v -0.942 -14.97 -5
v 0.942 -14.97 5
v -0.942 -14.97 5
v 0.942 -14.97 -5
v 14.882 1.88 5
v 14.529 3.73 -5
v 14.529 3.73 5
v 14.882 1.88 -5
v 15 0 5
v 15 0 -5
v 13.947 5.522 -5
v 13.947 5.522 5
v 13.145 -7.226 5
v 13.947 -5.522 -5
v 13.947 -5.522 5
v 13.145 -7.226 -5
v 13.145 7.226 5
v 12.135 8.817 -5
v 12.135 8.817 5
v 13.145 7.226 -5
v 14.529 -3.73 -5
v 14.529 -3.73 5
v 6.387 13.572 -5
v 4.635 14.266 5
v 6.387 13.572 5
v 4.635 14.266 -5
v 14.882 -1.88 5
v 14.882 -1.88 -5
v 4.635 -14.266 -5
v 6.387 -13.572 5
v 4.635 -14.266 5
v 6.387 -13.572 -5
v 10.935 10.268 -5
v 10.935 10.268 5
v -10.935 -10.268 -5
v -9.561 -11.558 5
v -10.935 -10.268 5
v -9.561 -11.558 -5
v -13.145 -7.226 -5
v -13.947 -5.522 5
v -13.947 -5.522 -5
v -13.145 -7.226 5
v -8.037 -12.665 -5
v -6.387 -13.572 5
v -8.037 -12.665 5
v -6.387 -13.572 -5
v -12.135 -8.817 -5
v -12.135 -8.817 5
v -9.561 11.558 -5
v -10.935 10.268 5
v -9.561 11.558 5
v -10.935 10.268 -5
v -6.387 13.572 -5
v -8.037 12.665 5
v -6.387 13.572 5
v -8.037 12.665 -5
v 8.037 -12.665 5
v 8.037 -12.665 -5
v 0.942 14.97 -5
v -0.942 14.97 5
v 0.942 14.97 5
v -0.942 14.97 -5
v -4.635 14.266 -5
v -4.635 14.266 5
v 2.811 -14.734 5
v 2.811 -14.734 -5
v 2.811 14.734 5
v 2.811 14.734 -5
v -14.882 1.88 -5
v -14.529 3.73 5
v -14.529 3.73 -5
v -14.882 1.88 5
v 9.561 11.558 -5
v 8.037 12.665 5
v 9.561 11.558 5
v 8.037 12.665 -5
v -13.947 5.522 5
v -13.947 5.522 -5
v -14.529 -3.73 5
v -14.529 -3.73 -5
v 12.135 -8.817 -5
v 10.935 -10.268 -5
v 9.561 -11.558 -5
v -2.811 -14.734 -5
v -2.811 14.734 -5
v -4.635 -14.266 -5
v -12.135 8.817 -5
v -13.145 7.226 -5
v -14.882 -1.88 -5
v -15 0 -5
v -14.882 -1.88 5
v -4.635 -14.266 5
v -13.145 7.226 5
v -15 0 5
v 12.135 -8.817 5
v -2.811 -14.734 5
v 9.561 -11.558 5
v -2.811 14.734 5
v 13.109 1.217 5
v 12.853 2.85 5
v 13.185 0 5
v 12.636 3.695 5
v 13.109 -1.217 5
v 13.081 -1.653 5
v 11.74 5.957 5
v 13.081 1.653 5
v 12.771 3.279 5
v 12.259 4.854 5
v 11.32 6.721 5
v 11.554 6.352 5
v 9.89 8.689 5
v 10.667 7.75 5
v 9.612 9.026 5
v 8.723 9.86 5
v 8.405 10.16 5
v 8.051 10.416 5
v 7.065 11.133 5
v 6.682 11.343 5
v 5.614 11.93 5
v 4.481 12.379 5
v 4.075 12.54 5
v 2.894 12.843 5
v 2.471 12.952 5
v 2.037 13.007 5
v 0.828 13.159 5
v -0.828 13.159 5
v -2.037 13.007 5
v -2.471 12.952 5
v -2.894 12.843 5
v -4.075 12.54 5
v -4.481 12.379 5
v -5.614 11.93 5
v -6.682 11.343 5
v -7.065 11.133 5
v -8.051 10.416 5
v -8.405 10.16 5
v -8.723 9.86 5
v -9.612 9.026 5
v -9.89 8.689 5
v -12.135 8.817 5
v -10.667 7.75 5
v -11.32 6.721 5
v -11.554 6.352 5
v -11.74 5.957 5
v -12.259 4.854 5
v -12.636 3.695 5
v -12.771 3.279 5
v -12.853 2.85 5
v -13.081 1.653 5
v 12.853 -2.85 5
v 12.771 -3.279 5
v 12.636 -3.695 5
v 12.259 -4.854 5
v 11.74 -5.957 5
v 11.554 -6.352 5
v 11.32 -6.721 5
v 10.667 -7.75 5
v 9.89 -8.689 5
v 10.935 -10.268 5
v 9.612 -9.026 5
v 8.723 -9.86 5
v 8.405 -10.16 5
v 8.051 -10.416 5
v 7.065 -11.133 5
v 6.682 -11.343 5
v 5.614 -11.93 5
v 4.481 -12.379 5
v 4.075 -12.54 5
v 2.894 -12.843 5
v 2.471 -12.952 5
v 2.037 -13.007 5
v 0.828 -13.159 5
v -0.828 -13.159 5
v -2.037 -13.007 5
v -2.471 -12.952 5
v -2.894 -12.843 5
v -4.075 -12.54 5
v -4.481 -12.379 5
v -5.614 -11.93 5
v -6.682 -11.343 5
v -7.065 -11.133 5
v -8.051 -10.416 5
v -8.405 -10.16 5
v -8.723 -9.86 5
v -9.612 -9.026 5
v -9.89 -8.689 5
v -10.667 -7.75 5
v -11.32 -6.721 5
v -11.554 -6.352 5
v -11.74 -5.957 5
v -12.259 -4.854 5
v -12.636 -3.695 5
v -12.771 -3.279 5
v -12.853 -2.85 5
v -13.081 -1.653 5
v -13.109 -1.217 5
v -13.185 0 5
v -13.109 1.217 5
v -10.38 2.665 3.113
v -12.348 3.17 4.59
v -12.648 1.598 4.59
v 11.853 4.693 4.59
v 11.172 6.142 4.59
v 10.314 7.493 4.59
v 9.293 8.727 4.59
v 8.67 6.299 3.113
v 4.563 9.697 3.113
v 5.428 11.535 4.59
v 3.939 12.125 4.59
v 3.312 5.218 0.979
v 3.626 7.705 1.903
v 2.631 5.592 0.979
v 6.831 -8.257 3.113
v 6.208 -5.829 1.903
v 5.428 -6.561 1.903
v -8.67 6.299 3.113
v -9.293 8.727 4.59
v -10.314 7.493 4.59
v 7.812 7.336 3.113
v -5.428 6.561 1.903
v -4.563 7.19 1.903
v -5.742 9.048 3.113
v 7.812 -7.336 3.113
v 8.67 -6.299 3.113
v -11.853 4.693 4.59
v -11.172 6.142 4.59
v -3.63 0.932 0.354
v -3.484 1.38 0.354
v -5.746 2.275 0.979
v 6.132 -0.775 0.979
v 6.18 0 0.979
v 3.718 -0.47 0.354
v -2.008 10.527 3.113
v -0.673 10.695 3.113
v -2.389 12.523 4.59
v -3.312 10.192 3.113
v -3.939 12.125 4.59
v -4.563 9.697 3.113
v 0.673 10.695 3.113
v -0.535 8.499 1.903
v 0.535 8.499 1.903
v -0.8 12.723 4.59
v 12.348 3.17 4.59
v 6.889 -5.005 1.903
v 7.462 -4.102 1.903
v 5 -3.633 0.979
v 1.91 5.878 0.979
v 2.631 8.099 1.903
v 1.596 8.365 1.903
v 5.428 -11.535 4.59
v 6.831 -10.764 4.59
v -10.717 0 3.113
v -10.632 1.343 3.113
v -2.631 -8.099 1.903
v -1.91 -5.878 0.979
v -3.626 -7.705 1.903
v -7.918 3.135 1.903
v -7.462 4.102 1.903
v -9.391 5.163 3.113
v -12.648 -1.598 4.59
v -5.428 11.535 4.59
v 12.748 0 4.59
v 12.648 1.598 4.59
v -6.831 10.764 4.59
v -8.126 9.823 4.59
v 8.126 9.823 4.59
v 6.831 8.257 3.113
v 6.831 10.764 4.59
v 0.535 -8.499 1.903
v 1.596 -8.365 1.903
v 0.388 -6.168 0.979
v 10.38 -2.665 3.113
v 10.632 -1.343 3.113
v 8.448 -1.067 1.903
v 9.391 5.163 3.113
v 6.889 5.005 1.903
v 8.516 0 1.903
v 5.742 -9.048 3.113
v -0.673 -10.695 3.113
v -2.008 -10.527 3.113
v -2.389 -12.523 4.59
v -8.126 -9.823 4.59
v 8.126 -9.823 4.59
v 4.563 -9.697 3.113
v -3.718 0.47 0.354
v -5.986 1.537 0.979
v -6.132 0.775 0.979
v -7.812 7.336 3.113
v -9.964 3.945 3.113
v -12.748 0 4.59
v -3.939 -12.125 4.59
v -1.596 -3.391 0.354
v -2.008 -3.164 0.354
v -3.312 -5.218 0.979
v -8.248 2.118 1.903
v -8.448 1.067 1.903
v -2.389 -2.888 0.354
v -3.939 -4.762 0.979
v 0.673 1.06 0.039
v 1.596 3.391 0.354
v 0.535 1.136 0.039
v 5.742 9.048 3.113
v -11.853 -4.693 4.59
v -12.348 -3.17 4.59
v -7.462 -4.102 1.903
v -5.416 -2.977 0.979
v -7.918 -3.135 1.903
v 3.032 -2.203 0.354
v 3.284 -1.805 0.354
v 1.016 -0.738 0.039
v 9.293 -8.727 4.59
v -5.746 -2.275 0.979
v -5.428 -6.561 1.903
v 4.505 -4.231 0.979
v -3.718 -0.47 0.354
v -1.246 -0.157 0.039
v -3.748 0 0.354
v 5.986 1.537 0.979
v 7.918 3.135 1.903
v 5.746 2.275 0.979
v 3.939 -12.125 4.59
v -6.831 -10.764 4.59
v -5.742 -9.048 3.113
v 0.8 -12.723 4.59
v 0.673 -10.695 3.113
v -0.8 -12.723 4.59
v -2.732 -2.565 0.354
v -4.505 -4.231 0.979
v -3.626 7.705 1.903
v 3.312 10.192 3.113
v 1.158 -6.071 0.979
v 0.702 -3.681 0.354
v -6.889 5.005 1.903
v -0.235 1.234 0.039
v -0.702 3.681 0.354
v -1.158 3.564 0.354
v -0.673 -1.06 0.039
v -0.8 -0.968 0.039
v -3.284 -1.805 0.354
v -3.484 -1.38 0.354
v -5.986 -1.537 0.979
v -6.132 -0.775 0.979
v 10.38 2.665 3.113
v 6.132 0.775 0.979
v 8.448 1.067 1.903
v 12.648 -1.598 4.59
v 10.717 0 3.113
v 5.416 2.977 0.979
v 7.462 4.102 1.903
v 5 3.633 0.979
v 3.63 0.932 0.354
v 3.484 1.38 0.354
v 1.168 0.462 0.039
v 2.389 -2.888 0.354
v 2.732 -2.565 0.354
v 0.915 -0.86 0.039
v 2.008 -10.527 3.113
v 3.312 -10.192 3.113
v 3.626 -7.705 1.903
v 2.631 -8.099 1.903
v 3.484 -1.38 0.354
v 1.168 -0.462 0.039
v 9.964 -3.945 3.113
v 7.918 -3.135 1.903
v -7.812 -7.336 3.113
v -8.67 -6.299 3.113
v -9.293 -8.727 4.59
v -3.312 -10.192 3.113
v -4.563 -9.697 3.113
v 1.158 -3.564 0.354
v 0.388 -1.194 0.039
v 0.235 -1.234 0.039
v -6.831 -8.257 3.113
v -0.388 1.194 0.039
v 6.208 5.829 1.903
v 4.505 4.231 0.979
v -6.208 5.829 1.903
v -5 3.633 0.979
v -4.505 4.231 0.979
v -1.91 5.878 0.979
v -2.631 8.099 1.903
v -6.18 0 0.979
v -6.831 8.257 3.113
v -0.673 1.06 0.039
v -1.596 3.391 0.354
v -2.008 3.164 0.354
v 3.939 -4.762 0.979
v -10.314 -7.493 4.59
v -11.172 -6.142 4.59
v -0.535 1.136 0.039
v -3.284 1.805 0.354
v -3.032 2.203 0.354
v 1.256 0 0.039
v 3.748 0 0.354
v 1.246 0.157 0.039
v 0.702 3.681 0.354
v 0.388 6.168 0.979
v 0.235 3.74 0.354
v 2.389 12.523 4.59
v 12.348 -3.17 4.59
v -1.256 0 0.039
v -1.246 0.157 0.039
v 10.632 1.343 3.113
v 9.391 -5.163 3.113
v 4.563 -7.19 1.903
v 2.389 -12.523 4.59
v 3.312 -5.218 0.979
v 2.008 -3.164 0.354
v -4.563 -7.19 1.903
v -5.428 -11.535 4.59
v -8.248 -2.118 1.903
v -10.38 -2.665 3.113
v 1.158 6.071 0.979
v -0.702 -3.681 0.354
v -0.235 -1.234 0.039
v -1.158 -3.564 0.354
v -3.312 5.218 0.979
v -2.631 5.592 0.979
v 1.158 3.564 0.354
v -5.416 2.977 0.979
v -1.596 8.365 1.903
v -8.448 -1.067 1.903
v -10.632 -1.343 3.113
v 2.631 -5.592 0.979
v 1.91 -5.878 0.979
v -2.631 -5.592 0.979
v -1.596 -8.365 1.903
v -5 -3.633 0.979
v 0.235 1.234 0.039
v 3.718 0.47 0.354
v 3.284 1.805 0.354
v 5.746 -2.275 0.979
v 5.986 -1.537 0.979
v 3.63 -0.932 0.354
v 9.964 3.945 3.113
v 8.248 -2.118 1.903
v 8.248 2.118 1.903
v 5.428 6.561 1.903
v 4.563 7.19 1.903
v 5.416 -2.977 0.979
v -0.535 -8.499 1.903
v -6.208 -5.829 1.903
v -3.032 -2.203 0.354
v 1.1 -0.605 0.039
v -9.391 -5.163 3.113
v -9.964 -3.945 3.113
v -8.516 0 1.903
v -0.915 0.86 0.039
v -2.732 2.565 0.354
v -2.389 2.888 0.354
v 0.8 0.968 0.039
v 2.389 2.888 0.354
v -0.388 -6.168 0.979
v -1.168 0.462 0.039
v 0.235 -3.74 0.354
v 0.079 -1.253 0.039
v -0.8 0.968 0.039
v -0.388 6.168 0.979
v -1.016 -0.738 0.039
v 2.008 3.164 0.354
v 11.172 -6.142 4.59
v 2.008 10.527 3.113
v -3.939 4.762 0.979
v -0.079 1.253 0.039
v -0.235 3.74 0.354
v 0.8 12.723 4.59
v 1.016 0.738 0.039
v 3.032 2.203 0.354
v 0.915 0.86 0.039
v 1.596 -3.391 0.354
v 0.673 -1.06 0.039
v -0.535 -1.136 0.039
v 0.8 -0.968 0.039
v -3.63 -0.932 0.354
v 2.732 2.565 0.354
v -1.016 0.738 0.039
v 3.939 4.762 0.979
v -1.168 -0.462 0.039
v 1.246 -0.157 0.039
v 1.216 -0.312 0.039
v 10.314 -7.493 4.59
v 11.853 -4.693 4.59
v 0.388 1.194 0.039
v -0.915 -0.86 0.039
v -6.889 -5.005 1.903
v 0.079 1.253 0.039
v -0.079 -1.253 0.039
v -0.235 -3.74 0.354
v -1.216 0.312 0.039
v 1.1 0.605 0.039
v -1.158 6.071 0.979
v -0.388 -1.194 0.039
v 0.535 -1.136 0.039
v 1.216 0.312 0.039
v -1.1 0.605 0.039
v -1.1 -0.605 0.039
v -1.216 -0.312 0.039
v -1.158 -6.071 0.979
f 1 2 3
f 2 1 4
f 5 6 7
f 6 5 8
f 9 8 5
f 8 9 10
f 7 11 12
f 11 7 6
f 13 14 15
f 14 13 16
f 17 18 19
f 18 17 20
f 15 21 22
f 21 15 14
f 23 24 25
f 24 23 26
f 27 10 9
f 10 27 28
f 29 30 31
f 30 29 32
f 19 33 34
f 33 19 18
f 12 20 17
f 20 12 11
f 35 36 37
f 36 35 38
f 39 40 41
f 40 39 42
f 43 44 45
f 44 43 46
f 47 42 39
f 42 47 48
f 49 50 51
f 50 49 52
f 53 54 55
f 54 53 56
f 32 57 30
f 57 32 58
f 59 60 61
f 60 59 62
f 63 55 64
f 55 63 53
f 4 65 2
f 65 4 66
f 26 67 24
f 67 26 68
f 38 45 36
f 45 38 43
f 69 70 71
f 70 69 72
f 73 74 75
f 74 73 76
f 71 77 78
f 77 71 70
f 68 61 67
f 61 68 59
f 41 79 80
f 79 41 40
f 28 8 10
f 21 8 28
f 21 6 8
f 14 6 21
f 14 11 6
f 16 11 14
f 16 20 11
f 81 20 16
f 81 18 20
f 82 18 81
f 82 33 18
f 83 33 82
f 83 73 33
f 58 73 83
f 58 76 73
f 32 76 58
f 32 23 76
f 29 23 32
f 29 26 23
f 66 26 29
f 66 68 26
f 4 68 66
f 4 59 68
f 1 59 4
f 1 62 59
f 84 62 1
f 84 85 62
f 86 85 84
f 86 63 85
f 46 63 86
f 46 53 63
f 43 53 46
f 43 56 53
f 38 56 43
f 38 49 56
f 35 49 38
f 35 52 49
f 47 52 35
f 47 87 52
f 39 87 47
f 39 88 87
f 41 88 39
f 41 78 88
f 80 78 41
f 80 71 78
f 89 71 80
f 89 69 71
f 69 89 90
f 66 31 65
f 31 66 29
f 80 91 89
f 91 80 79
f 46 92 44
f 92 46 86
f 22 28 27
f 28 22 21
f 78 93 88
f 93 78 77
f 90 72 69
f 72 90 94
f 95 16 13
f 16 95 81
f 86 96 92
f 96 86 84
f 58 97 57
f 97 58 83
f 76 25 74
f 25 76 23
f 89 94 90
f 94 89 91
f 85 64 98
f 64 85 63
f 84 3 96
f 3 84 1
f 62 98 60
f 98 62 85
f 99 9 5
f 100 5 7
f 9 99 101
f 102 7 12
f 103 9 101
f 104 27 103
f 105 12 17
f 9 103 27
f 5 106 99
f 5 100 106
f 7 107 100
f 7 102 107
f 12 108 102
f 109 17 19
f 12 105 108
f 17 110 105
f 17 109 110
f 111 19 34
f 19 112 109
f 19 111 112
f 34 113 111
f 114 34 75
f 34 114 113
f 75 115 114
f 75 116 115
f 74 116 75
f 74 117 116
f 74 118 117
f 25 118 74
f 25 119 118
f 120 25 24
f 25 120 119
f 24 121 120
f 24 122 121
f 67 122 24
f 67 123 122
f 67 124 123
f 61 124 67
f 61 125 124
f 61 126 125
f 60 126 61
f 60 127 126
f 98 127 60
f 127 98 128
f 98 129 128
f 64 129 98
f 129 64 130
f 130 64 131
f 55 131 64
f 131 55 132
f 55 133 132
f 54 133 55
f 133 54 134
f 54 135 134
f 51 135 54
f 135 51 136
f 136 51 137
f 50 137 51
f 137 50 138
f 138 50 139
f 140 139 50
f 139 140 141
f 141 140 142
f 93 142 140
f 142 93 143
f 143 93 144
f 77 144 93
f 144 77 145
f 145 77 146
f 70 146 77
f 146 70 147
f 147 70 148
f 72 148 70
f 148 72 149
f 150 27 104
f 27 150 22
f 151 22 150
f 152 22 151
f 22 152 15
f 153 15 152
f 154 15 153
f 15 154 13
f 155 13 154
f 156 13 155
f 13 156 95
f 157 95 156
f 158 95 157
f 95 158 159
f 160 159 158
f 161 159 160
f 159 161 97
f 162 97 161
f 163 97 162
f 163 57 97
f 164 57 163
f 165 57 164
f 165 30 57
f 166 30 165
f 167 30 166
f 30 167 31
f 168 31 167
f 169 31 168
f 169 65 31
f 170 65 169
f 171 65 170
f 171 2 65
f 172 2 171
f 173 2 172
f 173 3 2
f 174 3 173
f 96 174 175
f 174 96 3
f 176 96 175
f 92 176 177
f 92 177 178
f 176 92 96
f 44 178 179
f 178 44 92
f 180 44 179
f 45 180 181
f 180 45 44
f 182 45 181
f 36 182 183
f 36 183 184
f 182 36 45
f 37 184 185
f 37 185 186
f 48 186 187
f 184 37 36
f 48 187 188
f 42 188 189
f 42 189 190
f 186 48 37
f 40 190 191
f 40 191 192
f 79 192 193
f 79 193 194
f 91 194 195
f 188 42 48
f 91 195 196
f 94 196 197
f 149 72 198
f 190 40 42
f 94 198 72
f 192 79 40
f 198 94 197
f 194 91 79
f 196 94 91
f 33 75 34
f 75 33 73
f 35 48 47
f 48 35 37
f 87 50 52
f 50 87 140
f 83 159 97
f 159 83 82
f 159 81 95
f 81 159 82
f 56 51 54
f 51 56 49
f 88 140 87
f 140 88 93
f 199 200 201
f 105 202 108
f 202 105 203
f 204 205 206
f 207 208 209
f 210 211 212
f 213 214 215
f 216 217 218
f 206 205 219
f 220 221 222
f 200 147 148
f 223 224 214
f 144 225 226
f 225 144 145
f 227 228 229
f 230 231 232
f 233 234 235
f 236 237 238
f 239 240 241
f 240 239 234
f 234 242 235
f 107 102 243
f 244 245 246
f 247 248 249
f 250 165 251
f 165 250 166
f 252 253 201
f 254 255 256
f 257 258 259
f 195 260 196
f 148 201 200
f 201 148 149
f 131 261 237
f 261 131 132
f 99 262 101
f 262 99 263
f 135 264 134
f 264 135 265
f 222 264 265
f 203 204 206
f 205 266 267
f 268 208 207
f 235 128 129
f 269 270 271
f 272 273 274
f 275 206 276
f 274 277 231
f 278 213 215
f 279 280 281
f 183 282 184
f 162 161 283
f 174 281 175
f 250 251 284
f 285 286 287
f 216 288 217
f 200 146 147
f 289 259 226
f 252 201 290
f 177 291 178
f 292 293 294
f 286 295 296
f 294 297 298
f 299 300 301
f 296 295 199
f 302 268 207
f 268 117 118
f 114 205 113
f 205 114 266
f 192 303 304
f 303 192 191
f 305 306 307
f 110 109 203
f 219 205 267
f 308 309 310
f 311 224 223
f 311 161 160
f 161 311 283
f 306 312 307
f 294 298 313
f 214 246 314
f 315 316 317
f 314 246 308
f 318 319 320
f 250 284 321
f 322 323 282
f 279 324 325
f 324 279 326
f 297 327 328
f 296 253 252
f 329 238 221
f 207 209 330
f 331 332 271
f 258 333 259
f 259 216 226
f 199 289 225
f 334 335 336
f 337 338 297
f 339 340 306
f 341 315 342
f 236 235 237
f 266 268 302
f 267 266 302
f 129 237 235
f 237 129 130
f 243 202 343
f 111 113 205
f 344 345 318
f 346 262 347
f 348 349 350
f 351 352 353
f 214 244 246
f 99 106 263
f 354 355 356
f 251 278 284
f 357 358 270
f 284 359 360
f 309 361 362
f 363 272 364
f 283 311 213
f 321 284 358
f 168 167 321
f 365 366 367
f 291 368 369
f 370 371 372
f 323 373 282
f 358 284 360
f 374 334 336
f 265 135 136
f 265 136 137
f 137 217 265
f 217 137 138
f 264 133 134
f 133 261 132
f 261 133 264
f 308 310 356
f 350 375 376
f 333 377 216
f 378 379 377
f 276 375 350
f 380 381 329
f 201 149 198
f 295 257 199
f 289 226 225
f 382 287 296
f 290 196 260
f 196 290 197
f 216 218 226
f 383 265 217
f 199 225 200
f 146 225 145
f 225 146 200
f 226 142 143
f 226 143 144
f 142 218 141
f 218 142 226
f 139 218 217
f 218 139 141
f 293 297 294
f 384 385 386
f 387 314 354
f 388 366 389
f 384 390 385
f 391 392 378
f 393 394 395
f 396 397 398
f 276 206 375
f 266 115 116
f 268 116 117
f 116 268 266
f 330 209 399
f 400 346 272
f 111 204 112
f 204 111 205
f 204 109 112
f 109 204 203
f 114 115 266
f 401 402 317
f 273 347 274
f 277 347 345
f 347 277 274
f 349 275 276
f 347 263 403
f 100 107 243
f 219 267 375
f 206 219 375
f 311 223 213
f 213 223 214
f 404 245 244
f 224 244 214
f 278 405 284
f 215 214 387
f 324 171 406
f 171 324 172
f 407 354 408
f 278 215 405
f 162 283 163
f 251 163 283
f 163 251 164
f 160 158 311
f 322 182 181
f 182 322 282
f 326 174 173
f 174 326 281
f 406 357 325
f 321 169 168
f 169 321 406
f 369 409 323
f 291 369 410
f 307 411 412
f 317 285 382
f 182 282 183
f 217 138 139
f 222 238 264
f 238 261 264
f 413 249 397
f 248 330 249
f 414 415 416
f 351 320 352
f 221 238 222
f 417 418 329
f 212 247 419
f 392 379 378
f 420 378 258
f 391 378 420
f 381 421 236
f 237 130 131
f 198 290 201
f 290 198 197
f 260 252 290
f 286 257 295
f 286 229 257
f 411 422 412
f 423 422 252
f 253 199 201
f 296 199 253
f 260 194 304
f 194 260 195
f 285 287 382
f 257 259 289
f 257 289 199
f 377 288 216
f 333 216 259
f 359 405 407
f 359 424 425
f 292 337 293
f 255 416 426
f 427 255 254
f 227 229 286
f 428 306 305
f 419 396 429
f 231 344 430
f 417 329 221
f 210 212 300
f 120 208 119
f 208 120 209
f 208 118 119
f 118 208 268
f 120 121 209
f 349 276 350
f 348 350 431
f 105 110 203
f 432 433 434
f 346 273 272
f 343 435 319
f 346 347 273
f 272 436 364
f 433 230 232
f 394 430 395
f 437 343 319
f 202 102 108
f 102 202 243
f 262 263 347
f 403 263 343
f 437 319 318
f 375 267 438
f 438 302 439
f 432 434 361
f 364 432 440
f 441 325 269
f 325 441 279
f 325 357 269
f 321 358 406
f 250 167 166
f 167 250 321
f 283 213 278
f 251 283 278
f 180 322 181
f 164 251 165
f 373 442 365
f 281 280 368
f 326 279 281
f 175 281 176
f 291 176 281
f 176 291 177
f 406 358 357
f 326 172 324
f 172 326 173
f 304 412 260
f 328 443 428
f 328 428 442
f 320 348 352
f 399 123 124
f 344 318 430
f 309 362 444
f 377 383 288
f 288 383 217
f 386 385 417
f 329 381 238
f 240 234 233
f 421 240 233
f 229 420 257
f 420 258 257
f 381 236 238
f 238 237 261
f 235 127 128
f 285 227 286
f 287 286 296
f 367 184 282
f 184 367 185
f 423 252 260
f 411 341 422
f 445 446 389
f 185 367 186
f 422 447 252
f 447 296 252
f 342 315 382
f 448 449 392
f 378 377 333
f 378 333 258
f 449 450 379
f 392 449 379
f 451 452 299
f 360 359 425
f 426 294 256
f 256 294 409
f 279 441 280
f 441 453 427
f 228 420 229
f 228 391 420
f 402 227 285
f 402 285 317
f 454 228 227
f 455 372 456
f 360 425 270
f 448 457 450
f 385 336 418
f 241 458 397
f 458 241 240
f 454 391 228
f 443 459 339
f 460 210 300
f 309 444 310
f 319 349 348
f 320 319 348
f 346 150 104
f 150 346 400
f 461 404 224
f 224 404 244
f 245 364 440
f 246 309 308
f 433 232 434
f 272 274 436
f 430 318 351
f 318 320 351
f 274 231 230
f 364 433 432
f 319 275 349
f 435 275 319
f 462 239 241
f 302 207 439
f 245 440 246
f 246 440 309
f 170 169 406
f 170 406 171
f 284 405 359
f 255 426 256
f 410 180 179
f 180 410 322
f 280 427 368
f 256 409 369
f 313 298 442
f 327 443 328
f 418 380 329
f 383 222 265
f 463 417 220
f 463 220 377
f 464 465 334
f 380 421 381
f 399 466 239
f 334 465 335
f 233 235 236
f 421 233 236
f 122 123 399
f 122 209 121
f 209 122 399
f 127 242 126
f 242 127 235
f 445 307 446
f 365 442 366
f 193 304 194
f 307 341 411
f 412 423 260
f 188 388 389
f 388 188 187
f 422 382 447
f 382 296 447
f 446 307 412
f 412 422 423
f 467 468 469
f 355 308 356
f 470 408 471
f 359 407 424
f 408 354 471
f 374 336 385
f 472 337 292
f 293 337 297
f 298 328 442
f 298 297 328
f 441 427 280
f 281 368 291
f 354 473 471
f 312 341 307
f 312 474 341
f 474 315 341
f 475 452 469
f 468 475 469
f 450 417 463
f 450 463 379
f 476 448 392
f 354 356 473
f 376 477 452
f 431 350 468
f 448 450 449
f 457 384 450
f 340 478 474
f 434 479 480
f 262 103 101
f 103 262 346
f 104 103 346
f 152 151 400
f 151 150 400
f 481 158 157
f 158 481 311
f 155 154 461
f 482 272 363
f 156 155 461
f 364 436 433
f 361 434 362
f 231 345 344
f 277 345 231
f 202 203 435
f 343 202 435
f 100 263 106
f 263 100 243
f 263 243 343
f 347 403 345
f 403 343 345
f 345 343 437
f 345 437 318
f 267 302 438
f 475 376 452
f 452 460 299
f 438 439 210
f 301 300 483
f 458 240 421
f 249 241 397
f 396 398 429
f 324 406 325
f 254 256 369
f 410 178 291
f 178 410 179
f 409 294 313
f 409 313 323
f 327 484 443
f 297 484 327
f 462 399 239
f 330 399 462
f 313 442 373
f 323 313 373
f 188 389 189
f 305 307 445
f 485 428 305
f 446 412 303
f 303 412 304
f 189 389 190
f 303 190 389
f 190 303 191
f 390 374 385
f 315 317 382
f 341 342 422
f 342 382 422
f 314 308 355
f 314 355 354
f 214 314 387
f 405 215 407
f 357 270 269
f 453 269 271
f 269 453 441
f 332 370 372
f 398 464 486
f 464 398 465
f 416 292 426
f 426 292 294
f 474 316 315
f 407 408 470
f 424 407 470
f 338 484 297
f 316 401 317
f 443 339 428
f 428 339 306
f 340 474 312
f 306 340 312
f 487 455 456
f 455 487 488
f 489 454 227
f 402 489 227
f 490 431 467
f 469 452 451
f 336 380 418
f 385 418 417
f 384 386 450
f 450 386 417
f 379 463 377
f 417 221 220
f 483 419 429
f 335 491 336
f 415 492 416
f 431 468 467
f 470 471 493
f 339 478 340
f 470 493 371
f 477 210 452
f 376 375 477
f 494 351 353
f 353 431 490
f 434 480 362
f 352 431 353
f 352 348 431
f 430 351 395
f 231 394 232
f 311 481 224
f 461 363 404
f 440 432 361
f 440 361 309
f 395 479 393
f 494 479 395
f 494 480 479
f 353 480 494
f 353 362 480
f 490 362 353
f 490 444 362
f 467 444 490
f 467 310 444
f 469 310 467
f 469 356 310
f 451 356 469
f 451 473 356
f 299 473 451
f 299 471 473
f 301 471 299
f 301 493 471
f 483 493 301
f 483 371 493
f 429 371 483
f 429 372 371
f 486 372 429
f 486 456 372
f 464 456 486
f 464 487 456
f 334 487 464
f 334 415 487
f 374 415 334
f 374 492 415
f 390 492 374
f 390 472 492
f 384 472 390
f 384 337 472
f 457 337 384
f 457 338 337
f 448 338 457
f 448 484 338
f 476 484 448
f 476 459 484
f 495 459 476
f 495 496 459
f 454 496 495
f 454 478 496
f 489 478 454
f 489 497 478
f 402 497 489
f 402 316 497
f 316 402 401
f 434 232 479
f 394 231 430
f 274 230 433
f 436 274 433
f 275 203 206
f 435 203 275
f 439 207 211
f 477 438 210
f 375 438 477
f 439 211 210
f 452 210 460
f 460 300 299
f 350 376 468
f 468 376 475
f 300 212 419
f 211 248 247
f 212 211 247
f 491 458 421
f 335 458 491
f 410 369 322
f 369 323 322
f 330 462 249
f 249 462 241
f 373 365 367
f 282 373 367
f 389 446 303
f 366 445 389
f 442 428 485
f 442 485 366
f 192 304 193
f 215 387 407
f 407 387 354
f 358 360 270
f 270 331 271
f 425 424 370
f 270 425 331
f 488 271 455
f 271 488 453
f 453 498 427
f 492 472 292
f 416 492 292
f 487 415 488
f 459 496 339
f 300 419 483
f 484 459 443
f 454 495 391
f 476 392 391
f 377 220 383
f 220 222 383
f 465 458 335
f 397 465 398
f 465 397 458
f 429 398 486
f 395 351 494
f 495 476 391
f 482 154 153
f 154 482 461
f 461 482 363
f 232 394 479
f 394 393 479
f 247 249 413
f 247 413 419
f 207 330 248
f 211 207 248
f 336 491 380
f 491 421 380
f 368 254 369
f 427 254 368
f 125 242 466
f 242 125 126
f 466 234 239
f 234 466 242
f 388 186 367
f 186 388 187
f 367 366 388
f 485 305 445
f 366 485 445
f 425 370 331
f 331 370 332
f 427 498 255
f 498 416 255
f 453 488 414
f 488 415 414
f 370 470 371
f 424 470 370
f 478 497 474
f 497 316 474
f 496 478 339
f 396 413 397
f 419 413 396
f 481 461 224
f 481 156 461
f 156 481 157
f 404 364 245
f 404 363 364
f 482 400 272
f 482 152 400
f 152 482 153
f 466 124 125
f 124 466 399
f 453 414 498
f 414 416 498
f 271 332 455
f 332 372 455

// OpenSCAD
difference(){
cylinder(10,15,15,true,$fn=50);
translate([0,0,20])
    sphere(20, $fn=50);
}
